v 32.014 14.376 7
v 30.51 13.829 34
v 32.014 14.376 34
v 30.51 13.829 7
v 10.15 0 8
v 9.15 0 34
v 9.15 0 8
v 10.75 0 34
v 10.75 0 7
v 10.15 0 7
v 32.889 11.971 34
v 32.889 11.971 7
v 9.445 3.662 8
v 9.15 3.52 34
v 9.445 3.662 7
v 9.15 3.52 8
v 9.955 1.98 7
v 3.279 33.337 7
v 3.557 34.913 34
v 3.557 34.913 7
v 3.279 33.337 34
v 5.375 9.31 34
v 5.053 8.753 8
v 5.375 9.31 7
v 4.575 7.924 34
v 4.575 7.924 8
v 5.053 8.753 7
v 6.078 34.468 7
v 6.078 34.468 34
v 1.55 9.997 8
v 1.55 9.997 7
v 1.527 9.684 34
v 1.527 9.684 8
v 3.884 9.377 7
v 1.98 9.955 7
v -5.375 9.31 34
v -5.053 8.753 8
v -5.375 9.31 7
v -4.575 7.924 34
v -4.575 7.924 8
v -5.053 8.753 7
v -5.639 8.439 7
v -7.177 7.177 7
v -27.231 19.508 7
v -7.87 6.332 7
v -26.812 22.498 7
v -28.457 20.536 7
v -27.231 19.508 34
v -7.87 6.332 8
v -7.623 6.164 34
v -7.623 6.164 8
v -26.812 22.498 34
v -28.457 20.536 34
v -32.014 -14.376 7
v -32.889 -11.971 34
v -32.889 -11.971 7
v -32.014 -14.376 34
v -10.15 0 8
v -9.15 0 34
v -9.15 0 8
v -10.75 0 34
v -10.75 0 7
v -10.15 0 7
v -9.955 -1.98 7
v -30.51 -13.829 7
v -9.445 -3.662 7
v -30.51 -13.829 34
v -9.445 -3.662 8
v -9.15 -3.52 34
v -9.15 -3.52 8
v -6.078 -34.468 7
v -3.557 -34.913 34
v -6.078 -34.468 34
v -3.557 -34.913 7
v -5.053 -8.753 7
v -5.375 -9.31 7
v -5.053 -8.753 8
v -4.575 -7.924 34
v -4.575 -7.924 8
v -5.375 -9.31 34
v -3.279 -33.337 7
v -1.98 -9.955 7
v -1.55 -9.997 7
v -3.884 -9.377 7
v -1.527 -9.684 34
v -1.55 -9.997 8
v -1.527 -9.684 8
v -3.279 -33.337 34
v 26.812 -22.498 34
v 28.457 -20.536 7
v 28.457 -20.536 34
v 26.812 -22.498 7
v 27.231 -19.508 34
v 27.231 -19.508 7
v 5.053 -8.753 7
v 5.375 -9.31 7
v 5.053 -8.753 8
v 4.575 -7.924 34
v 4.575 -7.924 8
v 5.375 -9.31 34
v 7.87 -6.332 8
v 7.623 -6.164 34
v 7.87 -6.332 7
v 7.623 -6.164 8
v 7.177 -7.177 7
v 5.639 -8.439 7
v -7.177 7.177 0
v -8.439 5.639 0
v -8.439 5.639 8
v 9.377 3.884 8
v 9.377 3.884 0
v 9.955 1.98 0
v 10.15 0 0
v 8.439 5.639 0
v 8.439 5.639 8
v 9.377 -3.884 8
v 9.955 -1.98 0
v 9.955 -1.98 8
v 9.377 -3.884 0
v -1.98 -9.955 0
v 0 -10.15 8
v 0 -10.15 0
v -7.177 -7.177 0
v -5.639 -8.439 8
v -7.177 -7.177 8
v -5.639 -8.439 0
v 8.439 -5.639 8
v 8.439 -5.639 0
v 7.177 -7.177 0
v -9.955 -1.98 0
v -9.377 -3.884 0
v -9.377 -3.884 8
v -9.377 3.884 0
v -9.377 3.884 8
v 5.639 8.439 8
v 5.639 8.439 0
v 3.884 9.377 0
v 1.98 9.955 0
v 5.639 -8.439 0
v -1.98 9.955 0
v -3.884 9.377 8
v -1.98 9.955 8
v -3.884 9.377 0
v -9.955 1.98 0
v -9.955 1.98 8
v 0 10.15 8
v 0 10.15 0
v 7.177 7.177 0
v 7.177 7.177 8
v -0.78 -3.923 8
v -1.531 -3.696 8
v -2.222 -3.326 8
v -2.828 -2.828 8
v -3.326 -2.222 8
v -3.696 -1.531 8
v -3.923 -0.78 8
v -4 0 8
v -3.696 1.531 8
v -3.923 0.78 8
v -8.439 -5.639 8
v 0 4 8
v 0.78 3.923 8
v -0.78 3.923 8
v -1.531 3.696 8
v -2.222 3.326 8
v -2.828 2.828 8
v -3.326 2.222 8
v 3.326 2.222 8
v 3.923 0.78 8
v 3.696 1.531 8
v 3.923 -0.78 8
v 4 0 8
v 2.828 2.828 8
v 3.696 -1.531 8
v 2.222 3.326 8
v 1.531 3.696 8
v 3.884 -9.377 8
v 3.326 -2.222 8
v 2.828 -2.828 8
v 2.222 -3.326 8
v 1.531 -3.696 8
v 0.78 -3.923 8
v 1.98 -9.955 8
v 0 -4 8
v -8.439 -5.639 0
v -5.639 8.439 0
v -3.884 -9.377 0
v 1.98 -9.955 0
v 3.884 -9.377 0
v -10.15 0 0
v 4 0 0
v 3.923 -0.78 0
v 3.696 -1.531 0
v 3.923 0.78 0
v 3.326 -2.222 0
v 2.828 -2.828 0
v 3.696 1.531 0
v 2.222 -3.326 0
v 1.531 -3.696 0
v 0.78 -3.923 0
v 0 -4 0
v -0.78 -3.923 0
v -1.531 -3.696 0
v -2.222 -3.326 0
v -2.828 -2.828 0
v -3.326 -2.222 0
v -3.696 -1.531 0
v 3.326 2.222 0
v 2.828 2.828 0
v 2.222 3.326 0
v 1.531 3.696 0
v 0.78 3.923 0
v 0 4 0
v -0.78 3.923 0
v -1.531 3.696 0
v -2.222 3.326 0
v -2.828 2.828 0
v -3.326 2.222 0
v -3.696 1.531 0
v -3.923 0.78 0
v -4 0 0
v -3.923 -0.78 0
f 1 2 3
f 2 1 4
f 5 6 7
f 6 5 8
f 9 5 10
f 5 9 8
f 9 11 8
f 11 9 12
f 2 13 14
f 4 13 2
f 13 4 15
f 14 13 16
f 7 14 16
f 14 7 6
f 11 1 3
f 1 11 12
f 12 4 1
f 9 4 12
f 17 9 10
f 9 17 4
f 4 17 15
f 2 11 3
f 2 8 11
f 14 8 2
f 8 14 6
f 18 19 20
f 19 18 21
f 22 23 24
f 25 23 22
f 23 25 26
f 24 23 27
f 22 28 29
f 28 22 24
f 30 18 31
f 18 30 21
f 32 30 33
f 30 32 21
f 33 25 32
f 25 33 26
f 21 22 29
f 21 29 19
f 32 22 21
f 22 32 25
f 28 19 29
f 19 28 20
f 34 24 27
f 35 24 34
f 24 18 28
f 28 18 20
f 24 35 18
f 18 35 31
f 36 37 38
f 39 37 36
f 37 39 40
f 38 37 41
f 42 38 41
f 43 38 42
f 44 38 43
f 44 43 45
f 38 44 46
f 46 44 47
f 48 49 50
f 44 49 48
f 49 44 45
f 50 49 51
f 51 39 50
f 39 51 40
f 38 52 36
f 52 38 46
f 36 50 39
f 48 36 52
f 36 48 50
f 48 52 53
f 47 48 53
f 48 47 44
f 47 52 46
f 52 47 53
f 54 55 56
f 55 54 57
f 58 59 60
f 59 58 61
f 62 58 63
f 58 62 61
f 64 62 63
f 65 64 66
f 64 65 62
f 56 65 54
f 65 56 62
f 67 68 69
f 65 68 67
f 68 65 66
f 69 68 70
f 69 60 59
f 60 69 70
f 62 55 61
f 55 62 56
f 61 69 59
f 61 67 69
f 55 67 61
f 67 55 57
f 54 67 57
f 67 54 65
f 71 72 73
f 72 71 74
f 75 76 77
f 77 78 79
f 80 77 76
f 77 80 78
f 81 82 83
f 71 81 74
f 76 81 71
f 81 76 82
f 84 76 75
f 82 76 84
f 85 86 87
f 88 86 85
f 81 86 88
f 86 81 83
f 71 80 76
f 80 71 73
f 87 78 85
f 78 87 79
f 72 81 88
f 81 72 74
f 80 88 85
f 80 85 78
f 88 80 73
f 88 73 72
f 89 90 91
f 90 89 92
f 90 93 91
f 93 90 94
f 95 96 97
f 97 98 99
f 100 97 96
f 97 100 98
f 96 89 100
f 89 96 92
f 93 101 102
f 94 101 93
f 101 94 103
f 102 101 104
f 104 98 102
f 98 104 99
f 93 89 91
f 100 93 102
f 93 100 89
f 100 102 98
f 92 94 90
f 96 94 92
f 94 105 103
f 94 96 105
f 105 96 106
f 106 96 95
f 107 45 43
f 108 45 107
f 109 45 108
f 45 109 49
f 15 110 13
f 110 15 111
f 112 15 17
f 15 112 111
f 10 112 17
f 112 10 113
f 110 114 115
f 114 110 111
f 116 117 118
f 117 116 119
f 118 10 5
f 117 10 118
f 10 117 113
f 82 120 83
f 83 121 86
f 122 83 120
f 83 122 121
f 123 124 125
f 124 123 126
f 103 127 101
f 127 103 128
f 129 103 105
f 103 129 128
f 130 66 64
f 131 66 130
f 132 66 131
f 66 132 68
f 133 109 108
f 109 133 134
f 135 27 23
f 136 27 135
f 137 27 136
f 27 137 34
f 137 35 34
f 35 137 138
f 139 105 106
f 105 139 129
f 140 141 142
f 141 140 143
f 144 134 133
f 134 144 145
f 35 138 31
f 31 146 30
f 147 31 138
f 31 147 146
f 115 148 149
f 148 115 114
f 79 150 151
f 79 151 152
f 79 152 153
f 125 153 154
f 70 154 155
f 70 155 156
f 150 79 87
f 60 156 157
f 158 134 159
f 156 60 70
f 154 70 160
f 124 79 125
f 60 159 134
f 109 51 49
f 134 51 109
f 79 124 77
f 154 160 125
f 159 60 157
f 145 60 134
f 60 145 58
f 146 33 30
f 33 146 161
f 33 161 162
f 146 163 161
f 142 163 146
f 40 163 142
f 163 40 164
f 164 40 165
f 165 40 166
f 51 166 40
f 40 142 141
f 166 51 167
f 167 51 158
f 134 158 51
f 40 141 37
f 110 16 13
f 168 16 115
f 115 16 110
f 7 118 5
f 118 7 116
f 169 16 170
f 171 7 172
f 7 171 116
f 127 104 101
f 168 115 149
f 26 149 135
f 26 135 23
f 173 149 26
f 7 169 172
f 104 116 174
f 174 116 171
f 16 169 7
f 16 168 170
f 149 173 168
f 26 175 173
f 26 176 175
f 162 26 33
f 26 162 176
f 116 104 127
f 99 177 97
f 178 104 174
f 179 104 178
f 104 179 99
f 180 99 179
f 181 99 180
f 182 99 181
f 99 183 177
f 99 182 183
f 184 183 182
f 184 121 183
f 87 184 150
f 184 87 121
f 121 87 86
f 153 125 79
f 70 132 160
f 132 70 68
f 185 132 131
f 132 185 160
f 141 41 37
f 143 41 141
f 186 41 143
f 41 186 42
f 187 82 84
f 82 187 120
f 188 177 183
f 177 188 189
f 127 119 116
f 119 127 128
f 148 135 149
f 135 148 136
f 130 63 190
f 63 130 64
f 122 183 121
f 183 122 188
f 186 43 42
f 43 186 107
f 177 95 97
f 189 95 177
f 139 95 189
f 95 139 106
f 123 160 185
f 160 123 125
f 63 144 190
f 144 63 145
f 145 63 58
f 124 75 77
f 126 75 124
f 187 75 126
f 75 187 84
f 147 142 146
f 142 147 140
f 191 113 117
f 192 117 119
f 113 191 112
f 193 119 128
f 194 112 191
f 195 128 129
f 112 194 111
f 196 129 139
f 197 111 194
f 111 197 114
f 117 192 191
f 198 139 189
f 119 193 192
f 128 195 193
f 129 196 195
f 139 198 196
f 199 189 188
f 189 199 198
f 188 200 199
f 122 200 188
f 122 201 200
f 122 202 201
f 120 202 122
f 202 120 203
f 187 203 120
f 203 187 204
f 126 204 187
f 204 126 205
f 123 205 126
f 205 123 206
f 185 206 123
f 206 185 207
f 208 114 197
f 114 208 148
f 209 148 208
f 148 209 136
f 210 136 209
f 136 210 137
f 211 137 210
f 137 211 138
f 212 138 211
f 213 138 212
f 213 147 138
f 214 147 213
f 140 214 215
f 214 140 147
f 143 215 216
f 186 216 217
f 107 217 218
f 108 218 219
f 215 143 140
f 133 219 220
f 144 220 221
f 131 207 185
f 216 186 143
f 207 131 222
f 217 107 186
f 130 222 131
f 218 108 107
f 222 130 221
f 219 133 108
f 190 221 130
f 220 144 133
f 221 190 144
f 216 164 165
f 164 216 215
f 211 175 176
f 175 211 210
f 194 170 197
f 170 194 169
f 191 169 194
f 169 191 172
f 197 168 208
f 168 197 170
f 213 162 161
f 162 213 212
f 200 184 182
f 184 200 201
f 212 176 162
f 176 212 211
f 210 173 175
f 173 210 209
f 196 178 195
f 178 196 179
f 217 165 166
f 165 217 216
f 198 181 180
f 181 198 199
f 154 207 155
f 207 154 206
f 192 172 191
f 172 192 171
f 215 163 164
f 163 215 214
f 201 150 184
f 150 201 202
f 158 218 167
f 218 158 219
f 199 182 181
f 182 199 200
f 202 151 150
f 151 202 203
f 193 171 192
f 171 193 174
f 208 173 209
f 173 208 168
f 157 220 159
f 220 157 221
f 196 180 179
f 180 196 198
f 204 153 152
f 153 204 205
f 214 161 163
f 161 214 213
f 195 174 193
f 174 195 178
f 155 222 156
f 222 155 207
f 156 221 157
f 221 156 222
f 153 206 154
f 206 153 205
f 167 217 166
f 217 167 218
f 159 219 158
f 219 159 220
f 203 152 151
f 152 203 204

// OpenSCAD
$fn = 32;

// ----------------------------------------------------------------------
// Impeller: 70 mm, 6 blades, 34 mm tall
// ----------------------------------------------------------------------

// --- parameters (mm) ---
boss_d = 20.3;            // hub diameter
boss_h = 8;               // hub height
rotor_d = 70;             // outer diameter over the blades
vane_count = 6;           // number of blades
blade_t = 1.6;            // blade thickness
blade_h = 26;             // blade height
blade_in_r = 9.15;        // blade root radius
blade_out_r = 33.4;       // blade tip radius
sweep = 20;               // blade sweep, degrees
bore_d = 8;               // shaft bore

module hub() {
  cylinder(h = boss_h, d = boss_d);
}

module blade() {
  /* blade swept between two boxes: hull of the root and the tip section */
  hull() {
    translate([blade_in_r, 0, boss_h - 1])
      cube([blade_t, blade_t * 2.2, blade_h + 1], center = false);
    rotate([0, 0, sweep])
      translate([blade_out_r, 0, boss_h - 1])
        cube([blade_t, blade_t * 1.6, blade_h + 1], center = false);
  }
}

module blades() {
  for (i = [0 : vane_count - 1])
    rotate([0, 0, i * 360 / vane_count]) blade();
}

difference() {
  union() {
    hub();
    blades();
  }
  translate([0, 0, -1]) cylinder(h = boss_h + blade_h + 0 + 3, d = bore_d);
}
